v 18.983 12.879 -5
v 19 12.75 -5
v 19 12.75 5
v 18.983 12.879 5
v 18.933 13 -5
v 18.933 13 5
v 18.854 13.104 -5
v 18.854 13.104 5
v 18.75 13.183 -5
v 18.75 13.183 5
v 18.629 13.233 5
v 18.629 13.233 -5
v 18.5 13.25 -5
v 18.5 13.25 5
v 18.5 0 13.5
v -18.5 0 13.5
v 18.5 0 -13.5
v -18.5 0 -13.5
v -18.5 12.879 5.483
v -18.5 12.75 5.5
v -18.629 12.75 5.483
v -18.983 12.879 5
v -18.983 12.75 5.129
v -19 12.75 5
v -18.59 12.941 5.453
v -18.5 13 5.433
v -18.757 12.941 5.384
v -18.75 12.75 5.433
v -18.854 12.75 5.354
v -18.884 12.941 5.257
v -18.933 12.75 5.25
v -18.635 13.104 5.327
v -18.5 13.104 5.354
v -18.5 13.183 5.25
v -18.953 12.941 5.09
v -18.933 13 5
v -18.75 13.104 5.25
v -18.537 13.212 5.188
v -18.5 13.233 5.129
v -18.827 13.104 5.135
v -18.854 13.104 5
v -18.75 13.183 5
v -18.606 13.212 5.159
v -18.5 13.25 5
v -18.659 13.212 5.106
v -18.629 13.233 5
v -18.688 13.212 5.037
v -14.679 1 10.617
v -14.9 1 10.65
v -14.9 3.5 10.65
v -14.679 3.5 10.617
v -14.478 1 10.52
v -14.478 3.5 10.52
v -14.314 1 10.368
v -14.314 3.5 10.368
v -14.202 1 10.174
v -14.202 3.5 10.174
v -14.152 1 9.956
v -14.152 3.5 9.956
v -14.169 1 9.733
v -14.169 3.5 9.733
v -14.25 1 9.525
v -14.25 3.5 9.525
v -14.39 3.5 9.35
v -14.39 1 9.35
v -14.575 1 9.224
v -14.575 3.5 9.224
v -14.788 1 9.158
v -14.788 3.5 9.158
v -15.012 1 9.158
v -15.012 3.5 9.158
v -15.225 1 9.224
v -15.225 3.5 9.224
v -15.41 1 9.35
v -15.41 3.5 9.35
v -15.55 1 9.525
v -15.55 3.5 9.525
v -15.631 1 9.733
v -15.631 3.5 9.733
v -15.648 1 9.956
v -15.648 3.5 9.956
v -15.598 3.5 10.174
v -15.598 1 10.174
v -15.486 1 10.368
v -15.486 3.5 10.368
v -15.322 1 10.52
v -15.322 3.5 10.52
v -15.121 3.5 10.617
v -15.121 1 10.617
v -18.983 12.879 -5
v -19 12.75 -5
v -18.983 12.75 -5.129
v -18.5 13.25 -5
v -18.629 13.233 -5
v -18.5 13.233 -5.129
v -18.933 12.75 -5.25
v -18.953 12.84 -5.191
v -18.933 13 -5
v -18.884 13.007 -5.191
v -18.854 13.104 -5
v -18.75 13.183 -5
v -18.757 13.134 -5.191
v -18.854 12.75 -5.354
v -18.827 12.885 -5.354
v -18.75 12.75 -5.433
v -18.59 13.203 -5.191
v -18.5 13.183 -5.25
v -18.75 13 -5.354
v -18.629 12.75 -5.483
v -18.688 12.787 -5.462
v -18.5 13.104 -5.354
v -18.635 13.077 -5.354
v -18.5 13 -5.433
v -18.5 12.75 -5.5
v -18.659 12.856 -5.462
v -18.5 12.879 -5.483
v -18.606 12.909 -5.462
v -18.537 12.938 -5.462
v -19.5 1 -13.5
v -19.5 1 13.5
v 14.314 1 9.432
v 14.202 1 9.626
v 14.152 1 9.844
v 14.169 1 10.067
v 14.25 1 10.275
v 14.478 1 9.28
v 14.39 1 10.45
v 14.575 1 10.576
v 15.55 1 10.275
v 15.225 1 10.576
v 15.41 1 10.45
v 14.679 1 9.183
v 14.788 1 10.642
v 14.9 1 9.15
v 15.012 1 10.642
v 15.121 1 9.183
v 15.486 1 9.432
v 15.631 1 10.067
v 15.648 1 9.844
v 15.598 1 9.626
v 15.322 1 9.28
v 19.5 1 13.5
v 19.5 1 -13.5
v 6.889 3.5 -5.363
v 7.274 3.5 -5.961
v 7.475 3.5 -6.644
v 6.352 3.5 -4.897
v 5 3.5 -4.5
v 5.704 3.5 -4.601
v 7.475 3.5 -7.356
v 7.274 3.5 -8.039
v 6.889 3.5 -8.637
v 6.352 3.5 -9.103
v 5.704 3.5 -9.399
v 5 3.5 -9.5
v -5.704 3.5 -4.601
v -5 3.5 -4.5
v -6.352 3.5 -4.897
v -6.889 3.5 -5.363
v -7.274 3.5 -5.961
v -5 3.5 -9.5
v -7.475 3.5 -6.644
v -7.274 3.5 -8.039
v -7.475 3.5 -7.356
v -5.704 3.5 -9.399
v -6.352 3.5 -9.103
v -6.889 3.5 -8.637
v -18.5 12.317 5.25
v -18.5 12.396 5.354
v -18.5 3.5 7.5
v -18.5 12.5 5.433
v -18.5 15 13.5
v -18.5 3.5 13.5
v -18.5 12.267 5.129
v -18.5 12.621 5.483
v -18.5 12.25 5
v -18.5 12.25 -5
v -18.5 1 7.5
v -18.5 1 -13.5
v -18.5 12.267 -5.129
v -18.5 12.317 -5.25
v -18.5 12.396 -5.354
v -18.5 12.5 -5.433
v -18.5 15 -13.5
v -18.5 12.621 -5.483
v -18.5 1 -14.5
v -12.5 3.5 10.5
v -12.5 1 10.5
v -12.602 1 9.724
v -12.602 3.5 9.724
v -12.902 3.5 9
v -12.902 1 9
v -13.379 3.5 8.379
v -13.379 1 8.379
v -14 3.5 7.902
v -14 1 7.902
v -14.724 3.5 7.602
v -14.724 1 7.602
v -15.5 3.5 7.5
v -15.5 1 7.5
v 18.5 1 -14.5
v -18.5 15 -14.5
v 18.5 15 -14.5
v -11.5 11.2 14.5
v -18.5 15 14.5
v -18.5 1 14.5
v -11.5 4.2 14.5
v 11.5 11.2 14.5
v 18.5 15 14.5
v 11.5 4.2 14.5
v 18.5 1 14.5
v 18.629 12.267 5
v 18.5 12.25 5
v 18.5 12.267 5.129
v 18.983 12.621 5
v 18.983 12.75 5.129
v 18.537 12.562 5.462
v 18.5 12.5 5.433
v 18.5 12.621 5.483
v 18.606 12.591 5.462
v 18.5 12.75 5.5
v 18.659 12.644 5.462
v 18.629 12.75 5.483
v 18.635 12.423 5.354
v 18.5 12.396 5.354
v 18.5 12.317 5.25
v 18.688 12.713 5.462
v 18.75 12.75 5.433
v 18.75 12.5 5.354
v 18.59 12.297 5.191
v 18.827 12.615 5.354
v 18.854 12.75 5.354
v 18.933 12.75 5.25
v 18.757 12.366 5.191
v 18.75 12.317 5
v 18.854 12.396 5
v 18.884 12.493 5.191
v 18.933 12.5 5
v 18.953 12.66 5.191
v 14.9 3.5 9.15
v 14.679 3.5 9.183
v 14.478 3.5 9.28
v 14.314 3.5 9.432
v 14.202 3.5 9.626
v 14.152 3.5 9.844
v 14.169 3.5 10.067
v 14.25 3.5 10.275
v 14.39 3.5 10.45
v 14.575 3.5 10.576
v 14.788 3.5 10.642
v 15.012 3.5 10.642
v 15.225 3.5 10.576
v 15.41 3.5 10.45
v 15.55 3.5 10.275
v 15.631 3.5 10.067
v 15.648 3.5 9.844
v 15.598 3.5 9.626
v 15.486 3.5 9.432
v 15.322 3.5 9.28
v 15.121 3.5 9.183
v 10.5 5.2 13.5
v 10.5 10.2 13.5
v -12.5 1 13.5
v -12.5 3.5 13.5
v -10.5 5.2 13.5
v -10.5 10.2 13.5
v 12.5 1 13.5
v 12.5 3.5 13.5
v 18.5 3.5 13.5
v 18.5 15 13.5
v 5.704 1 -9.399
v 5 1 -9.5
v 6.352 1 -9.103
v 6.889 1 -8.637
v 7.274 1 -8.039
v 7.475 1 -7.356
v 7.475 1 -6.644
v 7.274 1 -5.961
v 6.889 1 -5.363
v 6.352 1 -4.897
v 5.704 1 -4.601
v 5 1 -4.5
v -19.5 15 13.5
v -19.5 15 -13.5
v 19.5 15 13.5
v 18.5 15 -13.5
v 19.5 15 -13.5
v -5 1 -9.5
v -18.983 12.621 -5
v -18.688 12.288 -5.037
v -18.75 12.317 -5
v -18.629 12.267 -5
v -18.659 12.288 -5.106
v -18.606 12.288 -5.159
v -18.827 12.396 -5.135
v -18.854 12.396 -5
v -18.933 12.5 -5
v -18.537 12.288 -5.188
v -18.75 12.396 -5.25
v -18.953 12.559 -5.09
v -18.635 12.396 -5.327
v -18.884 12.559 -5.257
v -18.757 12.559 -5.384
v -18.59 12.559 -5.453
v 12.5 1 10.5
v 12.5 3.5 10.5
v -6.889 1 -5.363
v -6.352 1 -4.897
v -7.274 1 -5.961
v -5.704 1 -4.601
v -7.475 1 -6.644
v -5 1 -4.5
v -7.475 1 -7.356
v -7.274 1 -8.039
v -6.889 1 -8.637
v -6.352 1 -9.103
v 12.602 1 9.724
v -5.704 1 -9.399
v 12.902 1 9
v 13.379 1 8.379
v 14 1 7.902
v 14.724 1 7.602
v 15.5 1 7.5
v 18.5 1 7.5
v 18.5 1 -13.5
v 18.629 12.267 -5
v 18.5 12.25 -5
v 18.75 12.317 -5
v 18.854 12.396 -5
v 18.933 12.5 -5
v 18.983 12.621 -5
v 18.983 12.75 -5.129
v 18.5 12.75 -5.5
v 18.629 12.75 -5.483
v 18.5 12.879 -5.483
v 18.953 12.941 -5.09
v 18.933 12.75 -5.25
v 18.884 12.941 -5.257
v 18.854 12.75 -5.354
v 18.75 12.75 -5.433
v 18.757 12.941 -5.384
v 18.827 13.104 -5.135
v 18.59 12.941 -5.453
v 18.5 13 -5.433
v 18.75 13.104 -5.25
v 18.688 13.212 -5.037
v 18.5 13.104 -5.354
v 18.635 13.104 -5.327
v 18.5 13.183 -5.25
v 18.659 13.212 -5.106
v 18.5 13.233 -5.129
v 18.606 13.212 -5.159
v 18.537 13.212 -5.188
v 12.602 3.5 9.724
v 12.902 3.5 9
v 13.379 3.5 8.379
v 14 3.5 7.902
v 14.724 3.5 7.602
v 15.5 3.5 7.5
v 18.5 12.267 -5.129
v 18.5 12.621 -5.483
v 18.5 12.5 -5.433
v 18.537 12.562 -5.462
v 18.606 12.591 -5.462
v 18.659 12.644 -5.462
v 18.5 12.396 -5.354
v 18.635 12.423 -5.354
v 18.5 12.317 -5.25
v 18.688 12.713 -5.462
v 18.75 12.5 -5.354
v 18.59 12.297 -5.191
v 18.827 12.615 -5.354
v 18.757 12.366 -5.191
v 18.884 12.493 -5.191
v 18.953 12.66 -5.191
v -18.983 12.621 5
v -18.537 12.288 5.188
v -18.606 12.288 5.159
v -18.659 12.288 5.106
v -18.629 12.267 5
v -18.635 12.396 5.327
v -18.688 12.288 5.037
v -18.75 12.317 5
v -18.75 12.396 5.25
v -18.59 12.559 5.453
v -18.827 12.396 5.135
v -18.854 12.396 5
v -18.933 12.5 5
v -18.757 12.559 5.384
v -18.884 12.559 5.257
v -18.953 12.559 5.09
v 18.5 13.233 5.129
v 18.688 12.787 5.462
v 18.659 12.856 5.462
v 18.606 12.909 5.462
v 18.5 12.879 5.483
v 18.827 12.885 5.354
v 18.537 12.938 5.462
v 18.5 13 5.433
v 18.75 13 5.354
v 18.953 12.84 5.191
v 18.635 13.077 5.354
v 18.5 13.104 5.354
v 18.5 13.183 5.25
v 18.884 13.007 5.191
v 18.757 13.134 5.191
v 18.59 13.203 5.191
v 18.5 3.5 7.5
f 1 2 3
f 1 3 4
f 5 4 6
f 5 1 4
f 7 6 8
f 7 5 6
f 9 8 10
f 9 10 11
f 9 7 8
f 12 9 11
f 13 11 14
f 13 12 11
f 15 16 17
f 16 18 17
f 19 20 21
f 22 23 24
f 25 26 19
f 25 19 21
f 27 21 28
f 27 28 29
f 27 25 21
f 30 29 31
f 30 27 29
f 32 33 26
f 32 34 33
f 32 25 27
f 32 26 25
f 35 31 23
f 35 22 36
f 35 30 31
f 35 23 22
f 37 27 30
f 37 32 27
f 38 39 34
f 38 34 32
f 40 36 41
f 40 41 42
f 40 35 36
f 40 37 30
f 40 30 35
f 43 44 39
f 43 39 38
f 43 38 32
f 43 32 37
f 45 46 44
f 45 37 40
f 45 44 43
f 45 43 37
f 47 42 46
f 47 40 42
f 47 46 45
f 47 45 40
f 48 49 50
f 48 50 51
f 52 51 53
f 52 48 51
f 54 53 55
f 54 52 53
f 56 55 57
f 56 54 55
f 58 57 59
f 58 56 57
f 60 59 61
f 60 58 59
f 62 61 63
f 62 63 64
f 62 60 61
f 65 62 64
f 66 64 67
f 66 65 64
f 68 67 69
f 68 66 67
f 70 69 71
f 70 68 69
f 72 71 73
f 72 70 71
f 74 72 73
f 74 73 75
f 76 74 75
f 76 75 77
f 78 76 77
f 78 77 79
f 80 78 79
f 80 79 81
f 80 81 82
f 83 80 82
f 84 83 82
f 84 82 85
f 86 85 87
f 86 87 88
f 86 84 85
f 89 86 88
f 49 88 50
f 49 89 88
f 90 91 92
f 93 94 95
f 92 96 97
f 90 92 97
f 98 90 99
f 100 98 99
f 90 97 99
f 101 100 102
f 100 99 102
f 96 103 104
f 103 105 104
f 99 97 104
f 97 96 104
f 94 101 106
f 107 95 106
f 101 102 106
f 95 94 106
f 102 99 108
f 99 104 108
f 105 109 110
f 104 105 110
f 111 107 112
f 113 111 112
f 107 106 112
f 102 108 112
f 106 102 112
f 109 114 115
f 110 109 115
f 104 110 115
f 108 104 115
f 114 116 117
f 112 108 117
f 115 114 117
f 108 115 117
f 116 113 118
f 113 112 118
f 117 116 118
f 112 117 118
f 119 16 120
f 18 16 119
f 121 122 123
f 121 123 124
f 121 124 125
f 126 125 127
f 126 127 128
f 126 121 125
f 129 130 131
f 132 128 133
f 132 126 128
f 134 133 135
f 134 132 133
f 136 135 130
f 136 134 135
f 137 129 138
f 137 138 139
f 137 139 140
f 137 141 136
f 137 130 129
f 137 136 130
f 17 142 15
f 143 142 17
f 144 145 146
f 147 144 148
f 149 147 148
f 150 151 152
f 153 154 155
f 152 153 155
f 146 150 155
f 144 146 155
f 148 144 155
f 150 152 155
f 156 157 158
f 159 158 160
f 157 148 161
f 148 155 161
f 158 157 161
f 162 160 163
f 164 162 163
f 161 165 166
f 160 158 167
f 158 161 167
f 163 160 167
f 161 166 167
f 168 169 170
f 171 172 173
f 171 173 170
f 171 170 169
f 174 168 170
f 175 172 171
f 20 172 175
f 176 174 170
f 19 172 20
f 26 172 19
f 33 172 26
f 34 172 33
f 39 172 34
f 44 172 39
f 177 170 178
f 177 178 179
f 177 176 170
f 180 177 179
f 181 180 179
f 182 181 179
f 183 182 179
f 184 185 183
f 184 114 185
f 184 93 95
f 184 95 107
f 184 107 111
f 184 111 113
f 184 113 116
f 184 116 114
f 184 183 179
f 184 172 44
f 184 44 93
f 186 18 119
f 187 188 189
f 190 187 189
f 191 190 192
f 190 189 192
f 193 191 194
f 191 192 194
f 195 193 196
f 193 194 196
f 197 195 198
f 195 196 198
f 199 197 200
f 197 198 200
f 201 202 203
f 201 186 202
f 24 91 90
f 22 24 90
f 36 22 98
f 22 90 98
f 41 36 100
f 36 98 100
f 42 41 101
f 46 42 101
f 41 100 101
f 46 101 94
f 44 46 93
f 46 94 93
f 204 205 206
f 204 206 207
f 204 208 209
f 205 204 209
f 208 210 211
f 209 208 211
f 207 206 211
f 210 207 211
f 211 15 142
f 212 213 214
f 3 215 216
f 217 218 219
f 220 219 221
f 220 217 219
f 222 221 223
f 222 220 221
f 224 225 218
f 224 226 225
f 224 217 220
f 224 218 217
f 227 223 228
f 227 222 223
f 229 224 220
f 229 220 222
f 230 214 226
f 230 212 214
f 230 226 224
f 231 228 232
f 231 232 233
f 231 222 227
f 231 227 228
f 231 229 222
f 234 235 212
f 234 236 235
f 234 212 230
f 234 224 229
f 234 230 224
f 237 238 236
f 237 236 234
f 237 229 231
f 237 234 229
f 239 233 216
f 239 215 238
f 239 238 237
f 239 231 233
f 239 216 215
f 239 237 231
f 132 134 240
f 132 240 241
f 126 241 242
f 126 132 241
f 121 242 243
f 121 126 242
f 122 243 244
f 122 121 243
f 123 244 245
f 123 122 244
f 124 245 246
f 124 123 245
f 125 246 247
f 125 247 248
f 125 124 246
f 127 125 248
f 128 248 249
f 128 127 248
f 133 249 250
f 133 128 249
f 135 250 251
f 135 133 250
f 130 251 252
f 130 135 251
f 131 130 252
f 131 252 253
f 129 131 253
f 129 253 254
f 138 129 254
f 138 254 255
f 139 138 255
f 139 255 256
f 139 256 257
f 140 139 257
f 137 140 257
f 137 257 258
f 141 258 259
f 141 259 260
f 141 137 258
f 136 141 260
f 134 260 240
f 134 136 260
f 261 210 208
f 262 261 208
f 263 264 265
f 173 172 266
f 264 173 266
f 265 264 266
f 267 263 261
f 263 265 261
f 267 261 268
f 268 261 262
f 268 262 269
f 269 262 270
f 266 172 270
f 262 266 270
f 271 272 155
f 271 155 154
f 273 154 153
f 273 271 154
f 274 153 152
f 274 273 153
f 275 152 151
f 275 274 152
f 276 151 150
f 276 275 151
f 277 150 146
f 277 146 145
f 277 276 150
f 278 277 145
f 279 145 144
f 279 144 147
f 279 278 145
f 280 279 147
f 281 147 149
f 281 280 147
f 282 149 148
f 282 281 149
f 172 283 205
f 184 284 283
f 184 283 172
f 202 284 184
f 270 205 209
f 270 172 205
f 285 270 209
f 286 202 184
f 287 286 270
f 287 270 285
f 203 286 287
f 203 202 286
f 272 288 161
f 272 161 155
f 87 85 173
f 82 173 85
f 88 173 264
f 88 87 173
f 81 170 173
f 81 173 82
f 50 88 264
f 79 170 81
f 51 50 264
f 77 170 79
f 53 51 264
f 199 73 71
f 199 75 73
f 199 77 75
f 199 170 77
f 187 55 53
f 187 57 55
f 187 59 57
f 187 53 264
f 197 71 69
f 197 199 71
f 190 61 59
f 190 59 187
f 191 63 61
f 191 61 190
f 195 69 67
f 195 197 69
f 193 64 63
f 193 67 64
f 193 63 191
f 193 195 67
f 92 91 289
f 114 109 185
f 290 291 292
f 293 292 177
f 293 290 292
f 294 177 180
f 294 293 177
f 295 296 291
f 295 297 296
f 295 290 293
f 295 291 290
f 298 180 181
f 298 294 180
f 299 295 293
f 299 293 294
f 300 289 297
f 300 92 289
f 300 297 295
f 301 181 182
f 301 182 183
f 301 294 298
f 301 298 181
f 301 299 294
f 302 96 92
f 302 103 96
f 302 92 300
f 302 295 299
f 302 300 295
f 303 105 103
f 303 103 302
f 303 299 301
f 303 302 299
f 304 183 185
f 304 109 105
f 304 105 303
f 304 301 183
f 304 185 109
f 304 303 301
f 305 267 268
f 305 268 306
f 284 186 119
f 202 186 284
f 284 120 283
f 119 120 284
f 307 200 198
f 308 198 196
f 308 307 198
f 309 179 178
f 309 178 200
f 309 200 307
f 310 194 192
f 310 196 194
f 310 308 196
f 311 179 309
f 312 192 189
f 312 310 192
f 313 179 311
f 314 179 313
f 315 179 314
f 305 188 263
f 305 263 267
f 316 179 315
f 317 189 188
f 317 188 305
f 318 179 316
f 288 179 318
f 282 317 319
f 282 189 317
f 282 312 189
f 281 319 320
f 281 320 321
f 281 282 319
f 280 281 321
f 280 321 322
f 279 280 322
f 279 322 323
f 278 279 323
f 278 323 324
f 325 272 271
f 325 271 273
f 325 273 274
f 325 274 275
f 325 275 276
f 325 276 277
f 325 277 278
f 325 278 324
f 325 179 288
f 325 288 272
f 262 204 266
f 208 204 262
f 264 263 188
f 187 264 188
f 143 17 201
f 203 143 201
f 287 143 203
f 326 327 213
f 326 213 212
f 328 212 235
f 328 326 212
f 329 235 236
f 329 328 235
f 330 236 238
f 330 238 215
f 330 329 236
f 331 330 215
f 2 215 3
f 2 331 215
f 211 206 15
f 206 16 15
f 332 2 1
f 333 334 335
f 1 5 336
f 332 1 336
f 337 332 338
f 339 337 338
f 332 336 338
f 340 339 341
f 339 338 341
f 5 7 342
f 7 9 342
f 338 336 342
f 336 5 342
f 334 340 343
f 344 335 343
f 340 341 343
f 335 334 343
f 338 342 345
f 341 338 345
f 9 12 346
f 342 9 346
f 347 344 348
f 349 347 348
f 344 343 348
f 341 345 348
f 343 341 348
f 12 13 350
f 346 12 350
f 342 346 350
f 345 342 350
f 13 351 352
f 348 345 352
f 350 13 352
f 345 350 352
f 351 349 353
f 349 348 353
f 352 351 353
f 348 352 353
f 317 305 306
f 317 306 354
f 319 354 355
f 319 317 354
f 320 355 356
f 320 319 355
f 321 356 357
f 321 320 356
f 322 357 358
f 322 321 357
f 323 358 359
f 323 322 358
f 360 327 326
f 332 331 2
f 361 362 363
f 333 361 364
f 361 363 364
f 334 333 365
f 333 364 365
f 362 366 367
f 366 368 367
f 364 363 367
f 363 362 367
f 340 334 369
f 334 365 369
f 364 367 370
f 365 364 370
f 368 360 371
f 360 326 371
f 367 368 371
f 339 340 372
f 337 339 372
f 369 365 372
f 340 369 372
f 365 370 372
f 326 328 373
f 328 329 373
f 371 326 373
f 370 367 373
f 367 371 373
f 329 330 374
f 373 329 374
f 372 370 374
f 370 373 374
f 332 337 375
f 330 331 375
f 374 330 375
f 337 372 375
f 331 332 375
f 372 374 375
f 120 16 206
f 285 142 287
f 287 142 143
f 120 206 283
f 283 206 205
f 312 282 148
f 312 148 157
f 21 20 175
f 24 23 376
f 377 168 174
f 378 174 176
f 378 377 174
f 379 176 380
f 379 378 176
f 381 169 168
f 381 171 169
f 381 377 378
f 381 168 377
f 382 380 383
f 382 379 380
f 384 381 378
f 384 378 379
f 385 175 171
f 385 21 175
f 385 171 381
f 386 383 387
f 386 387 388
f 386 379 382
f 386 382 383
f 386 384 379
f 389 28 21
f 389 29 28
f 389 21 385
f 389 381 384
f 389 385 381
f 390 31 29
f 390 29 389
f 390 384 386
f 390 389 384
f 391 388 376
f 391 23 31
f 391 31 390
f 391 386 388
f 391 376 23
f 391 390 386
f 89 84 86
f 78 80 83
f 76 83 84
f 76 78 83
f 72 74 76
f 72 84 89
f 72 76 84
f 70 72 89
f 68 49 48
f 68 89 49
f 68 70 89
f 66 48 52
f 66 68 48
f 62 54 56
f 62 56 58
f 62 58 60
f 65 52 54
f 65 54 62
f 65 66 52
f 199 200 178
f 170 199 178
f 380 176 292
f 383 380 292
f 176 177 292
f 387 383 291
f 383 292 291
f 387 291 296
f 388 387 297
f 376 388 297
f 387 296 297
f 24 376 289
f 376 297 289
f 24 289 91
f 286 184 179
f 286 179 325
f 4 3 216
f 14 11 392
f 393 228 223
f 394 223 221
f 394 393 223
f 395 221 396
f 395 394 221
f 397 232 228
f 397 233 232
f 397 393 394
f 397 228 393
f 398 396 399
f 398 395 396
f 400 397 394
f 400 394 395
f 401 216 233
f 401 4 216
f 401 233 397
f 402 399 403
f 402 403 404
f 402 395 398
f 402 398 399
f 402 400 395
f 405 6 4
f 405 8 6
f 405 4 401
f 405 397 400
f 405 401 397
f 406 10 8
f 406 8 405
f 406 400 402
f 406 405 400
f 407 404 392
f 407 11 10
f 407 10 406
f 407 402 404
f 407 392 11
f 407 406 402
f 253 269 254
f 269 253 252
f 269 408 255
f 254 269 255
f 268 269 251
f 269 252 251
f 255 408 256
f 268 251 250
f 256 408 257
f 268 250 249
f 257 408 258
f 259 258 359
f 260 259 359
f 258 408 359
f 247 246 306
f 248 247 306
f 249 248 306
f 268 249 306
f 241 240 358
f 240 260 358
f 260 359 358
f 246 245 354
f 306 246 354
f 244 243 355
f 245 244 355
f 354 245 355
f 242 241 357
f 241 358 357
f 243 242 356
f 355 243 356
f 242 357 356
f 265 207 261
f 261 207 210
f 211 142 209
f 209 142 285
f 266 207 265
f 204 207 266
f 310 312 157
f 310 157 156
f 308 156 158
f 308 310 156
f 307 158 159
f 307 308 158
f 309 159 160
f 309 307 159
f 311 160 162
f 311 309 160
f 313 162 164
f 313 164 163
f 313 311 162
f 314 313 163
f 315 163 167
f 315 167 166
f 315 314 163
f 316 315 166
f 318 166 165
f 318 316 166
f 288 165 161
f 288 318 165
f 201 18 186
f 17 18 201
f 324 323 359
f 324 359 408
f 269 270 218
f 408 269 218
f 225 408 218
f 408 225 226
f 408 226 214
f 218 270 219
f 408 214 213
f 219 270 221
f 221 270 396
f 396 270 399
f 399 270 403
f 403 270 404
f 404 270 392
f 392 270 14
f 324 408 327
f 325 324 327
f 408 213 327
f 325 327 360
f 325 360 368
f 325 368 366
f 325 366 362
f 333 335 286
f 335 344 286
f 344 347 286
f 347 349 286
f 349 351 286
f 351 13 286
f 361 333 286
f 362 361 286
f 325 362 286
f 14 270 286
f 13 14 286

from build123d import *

# Parameters (mm, degrees)
SKETCH1_W            = 39
SKETCH1_H            = 29
BOSS_EXTRUDE1_DEPTH  = 15
SKETCH2_W            = 37
SKETCH2_H            = 27
CUT_EXTRUDE1_DEPTH   = 14
CHAMFER1_SIZE        = 1
CUT_EXTRUDE2_REACH   = 40.03
SKETCH3_W            = 21
SKETCH3_H            = 5
SKETCH4_W            = 11
SKETCH4_H            = 1
CUT_EXTRUDE3_DEPTH   = 0.5
FILLET1_R            = 0.5
FILLET1_OF_MIRROR2_R = 0.5
SKETCH5_R            = 0.75
BOSS_EXTRUDE2_DEPTH  = 2.5
CHAMFER2_SIZE        = 1


with BuildPart() as part:
    # Sketch1 → Boss-Extrude1 (new body)
    with BuildSketch(Plane(origin=(0, 0, 0), x_dir=(1, 0, 0), z_dir=(0, 1, 0))):
        Rectangle(SKETCH1_W, SKETCH1_H)
    extrude(amount=BOSS_EXTRUDE1_DEPTH)

    # Sketch2 → Cut-Extrude1 (cut)
    with BuildSketch(Plane(origin=(0, 15, 0), x_dir=(1, 0, 0), z_dir=(0, 1, 0))):
        Rectangle(SKETCH2_W, SKETCH2_H)
    extrude(amount=-CUT_EXTRUDE1_DEPTH, mode=Mode.SUBTRACT)

    # Chamfer1
    chamfer1_edges = [part.edges().sort_by_distance(p)[0] for p in [
        (0, 0, 14.5),
        (-19.5, 0, 0),
        (0, 0, -14.5),
        (19.5, 0, 0),
        (19.5, 7.5, 14.5),
        (-19.5, 7.5, 14.5),
        (-19.5, 7.5, -14.5),
        (19.5, 7.5, -14.5),
    ]]
    chamfer(chamfer1_edges, length=CHAMFER1_SIZE)

    # Sketch3 → Cut-Extrude2 (cut, up to next)
    with BuildSketch(Plane.XY.offset(14.5), mode=Mode.PRIVATE) as cut_extrude2_sk1:
        with Locations((0, 7.7)):
            Rectangle(SKETCH3_W, SKETCH3_H)
    cut_extrude2_tool1 = extrude(cut_extrude2_sk1.sketch, amount=-CUT_EXTRUDE2_REACH, mode=Mode.PRIVATE) & part.part
    add(cut_extrude2_tool1.solids().sort_by_distance((0, 7.7, 14.5))[0], mode=Mode.SUBTRACT)

    # Sketch4 → Cut-Extrude3 (cut)
    with BuildSketch(Plane(origin=(-18.5, 0, 0), x_dir=(0, 0, -1), z_dir=(1, 0, 0))):
        with Locations((0, 12.75)):
            Rectangle(SKETCH4_W, SKETCH4_H)
    cut_extrude3 = extrude(amount=-CUT_EXTRUDE3_DEPTH, mode=Mode.SUBTRACT)

    # Fillet1
    fillet1_edges = [part.edges().sort_by_distance(p)[0] for p in [
        (-19, 12.75, 5.5),
    ]]
    fillet(fillet1_edges, radius=FILLET1_R - 0.0001)  # a hair under: the kernel refuses the full size
    fillet1_2_edges = [part.edges().sort_by_distance(p)[0] for p in [
        (-19, 13.25, -0.24995),
    ]]
    fillet(fillet1_2_edges, radius=FILLET1_R - 0.0001)  # a hair under: the kernel refuses the full size
    fillet1_3_edges = [part.edges().sort_by_distance(p)[0] for p in [
        (-19, 12.50005, -5.5),
    ]]
    fillet(fillet1_3_edges, radius=FILLET1_R - 0.0001)  # a hair under: the kernel refuses the full size
    fillet1_4_edges = [part.edges().sort_by_distance(p)[0] for p in [
        (-19, 12.25, 0),
    ]]
    fillet(fillet1_4_edges, radius=FILLET1_R - 0.0001)  # a hair under: the kernel refuses the full size

    # Mirror2: Cut-Extrude3 across plane
    add(cut_extrude3.mirror(Plane(origin=(0, 0, 0), x_dir=(0, 0, 1), z_dir=(1, 0, 0))), mode=Mode.SUBTRACT)

    # Fillet1 of Mirror2
    fillet1_of_mirror2_edges = [part.edges().sort_by_distance(p)[0] for p in [
        (19, 12.25, 0),
    ]]
    fillet(fillet1_of_mirror2_edges, radius=FILLET1_OF_MIRROR2_R - 0.0001)  # a hair under: the kernel refuses the full size
    fillet1_of_mirror2_2_edges = [part.edges().sort_by_distance(p)[0] for p in [
        (19, 12.99995, -5.5),
    ]]
    fillet(fillet1_of_mirror2_2_edges, radius=FILLET1_OF_MIRROR2_R - 0.0001)  # a hair under: the kernel refuses the full size
    fillet1_of_mirror2_3_edges = [part.edges().sort_by_distance(p)[0] for p in [
        (19, 13.25, 0.24995),
    ]]
    fillet(fillet1_of_mirror2_3_edges, radius=FILLET1_OF_MIRROR2_R - 0.0001)  # a hair under: the kernel refuses the full size
    fillet1_of_mirror2_4_edges = [part.edges().sort_by_distance(p)[0] for p in [
        (19, 12.75, 5.5),
    ]]
    fillet(fillet1_of_mirror2_4_edges, radius=FILLET1_OF_MIRROR2_R - 0.0001)  # a hair under: the kernel refuses the full size

    # Sketch5 → Boss-Extrude2 (add)
    # profile 1 of 3: a face of its own
    with BuildSketch(Plane(origin=(0, 1, 0), x_dir=(1, 0, 0), z_dir=(0, 1, 0))):
        with BuildLine():
            Line((-18.5, -13.5), (-12.5, -13.5))
            Line((-12.5, -13.5), (-12.5, -10.5))
            ThreePointArc((-12.5, -10.5), (-13.378679656, -8.378679656), (-15.5, -7.5))
            Line((-15.5, -7.5), (-18.5, -7.5))
            Line((-18.5, -7.5), (-18.5, -13.5))
        make_face()
        with Locations(Location((-14.9, -9.9, 0), (0, 0, 270))):
            Circle(SKETCH5_R, mode=Mode.SUBTRACT)
    # profile 2 of 3: a face of its own
    with BuildSketch(Plane(origin=(0, 1, 0), x_dir=(1, 0, 0), z_dir=(0, 1, 0))):
        with BuildLine():
            Line((-5, 9.5), (5, 9.5))
            ThreePointArc((5, 9.5), (7.5, 7), (5, 4.5))
            Line((5, 4.5), (-5, 4.5))
            ThreePointArc((-5, 4.5), (-7.5, 7), (-5, 9.5))
        make_face()
    # profile 3 of 3: a face of its own
    with BuildSketch(Plane(origin=(0, 1, 0), x_dir=(1, 0, 0), z_dir=(0, 1, 0))):
        with BuildLine():
            Line((12.5, -13.5), (12.5, -10.5))
            ThreePointArc((12.5, -10.5), (13.378679656, -8.378679656), (15.5, -7.5))
            Line((15.5, -7.5), (18.5, -7.5))
            Line((18.5, -7.5), (18.5, -13.5))
            Line((18.5, -13.5), (12.5, -13.5))
        make_face()
        with Locations(Location((14.9, -9.9, 0), (0, 0, 90))):
            Circle(SKETCH5_R, mode=Mode.SUBTRACT)
    extrude(amount=BOSS_EXTRUDE2_DEPTH)

    # Chamfer2
    chamfer2_edges = [part.edges().sort_by_distance(p)[0] for p in [
        (-10.5, 7.7, 14.5),
        (0, 5.2, 14.5),
        (10.5, 7.7, 14.5),
        (0, 10.2, 14.5),
    ]]
    chamfer(chamfer2_edges, length=CHAMFER2_SIZE - 0.0001)  # a hair under: the kernel refuses the full size


solid = part.part
